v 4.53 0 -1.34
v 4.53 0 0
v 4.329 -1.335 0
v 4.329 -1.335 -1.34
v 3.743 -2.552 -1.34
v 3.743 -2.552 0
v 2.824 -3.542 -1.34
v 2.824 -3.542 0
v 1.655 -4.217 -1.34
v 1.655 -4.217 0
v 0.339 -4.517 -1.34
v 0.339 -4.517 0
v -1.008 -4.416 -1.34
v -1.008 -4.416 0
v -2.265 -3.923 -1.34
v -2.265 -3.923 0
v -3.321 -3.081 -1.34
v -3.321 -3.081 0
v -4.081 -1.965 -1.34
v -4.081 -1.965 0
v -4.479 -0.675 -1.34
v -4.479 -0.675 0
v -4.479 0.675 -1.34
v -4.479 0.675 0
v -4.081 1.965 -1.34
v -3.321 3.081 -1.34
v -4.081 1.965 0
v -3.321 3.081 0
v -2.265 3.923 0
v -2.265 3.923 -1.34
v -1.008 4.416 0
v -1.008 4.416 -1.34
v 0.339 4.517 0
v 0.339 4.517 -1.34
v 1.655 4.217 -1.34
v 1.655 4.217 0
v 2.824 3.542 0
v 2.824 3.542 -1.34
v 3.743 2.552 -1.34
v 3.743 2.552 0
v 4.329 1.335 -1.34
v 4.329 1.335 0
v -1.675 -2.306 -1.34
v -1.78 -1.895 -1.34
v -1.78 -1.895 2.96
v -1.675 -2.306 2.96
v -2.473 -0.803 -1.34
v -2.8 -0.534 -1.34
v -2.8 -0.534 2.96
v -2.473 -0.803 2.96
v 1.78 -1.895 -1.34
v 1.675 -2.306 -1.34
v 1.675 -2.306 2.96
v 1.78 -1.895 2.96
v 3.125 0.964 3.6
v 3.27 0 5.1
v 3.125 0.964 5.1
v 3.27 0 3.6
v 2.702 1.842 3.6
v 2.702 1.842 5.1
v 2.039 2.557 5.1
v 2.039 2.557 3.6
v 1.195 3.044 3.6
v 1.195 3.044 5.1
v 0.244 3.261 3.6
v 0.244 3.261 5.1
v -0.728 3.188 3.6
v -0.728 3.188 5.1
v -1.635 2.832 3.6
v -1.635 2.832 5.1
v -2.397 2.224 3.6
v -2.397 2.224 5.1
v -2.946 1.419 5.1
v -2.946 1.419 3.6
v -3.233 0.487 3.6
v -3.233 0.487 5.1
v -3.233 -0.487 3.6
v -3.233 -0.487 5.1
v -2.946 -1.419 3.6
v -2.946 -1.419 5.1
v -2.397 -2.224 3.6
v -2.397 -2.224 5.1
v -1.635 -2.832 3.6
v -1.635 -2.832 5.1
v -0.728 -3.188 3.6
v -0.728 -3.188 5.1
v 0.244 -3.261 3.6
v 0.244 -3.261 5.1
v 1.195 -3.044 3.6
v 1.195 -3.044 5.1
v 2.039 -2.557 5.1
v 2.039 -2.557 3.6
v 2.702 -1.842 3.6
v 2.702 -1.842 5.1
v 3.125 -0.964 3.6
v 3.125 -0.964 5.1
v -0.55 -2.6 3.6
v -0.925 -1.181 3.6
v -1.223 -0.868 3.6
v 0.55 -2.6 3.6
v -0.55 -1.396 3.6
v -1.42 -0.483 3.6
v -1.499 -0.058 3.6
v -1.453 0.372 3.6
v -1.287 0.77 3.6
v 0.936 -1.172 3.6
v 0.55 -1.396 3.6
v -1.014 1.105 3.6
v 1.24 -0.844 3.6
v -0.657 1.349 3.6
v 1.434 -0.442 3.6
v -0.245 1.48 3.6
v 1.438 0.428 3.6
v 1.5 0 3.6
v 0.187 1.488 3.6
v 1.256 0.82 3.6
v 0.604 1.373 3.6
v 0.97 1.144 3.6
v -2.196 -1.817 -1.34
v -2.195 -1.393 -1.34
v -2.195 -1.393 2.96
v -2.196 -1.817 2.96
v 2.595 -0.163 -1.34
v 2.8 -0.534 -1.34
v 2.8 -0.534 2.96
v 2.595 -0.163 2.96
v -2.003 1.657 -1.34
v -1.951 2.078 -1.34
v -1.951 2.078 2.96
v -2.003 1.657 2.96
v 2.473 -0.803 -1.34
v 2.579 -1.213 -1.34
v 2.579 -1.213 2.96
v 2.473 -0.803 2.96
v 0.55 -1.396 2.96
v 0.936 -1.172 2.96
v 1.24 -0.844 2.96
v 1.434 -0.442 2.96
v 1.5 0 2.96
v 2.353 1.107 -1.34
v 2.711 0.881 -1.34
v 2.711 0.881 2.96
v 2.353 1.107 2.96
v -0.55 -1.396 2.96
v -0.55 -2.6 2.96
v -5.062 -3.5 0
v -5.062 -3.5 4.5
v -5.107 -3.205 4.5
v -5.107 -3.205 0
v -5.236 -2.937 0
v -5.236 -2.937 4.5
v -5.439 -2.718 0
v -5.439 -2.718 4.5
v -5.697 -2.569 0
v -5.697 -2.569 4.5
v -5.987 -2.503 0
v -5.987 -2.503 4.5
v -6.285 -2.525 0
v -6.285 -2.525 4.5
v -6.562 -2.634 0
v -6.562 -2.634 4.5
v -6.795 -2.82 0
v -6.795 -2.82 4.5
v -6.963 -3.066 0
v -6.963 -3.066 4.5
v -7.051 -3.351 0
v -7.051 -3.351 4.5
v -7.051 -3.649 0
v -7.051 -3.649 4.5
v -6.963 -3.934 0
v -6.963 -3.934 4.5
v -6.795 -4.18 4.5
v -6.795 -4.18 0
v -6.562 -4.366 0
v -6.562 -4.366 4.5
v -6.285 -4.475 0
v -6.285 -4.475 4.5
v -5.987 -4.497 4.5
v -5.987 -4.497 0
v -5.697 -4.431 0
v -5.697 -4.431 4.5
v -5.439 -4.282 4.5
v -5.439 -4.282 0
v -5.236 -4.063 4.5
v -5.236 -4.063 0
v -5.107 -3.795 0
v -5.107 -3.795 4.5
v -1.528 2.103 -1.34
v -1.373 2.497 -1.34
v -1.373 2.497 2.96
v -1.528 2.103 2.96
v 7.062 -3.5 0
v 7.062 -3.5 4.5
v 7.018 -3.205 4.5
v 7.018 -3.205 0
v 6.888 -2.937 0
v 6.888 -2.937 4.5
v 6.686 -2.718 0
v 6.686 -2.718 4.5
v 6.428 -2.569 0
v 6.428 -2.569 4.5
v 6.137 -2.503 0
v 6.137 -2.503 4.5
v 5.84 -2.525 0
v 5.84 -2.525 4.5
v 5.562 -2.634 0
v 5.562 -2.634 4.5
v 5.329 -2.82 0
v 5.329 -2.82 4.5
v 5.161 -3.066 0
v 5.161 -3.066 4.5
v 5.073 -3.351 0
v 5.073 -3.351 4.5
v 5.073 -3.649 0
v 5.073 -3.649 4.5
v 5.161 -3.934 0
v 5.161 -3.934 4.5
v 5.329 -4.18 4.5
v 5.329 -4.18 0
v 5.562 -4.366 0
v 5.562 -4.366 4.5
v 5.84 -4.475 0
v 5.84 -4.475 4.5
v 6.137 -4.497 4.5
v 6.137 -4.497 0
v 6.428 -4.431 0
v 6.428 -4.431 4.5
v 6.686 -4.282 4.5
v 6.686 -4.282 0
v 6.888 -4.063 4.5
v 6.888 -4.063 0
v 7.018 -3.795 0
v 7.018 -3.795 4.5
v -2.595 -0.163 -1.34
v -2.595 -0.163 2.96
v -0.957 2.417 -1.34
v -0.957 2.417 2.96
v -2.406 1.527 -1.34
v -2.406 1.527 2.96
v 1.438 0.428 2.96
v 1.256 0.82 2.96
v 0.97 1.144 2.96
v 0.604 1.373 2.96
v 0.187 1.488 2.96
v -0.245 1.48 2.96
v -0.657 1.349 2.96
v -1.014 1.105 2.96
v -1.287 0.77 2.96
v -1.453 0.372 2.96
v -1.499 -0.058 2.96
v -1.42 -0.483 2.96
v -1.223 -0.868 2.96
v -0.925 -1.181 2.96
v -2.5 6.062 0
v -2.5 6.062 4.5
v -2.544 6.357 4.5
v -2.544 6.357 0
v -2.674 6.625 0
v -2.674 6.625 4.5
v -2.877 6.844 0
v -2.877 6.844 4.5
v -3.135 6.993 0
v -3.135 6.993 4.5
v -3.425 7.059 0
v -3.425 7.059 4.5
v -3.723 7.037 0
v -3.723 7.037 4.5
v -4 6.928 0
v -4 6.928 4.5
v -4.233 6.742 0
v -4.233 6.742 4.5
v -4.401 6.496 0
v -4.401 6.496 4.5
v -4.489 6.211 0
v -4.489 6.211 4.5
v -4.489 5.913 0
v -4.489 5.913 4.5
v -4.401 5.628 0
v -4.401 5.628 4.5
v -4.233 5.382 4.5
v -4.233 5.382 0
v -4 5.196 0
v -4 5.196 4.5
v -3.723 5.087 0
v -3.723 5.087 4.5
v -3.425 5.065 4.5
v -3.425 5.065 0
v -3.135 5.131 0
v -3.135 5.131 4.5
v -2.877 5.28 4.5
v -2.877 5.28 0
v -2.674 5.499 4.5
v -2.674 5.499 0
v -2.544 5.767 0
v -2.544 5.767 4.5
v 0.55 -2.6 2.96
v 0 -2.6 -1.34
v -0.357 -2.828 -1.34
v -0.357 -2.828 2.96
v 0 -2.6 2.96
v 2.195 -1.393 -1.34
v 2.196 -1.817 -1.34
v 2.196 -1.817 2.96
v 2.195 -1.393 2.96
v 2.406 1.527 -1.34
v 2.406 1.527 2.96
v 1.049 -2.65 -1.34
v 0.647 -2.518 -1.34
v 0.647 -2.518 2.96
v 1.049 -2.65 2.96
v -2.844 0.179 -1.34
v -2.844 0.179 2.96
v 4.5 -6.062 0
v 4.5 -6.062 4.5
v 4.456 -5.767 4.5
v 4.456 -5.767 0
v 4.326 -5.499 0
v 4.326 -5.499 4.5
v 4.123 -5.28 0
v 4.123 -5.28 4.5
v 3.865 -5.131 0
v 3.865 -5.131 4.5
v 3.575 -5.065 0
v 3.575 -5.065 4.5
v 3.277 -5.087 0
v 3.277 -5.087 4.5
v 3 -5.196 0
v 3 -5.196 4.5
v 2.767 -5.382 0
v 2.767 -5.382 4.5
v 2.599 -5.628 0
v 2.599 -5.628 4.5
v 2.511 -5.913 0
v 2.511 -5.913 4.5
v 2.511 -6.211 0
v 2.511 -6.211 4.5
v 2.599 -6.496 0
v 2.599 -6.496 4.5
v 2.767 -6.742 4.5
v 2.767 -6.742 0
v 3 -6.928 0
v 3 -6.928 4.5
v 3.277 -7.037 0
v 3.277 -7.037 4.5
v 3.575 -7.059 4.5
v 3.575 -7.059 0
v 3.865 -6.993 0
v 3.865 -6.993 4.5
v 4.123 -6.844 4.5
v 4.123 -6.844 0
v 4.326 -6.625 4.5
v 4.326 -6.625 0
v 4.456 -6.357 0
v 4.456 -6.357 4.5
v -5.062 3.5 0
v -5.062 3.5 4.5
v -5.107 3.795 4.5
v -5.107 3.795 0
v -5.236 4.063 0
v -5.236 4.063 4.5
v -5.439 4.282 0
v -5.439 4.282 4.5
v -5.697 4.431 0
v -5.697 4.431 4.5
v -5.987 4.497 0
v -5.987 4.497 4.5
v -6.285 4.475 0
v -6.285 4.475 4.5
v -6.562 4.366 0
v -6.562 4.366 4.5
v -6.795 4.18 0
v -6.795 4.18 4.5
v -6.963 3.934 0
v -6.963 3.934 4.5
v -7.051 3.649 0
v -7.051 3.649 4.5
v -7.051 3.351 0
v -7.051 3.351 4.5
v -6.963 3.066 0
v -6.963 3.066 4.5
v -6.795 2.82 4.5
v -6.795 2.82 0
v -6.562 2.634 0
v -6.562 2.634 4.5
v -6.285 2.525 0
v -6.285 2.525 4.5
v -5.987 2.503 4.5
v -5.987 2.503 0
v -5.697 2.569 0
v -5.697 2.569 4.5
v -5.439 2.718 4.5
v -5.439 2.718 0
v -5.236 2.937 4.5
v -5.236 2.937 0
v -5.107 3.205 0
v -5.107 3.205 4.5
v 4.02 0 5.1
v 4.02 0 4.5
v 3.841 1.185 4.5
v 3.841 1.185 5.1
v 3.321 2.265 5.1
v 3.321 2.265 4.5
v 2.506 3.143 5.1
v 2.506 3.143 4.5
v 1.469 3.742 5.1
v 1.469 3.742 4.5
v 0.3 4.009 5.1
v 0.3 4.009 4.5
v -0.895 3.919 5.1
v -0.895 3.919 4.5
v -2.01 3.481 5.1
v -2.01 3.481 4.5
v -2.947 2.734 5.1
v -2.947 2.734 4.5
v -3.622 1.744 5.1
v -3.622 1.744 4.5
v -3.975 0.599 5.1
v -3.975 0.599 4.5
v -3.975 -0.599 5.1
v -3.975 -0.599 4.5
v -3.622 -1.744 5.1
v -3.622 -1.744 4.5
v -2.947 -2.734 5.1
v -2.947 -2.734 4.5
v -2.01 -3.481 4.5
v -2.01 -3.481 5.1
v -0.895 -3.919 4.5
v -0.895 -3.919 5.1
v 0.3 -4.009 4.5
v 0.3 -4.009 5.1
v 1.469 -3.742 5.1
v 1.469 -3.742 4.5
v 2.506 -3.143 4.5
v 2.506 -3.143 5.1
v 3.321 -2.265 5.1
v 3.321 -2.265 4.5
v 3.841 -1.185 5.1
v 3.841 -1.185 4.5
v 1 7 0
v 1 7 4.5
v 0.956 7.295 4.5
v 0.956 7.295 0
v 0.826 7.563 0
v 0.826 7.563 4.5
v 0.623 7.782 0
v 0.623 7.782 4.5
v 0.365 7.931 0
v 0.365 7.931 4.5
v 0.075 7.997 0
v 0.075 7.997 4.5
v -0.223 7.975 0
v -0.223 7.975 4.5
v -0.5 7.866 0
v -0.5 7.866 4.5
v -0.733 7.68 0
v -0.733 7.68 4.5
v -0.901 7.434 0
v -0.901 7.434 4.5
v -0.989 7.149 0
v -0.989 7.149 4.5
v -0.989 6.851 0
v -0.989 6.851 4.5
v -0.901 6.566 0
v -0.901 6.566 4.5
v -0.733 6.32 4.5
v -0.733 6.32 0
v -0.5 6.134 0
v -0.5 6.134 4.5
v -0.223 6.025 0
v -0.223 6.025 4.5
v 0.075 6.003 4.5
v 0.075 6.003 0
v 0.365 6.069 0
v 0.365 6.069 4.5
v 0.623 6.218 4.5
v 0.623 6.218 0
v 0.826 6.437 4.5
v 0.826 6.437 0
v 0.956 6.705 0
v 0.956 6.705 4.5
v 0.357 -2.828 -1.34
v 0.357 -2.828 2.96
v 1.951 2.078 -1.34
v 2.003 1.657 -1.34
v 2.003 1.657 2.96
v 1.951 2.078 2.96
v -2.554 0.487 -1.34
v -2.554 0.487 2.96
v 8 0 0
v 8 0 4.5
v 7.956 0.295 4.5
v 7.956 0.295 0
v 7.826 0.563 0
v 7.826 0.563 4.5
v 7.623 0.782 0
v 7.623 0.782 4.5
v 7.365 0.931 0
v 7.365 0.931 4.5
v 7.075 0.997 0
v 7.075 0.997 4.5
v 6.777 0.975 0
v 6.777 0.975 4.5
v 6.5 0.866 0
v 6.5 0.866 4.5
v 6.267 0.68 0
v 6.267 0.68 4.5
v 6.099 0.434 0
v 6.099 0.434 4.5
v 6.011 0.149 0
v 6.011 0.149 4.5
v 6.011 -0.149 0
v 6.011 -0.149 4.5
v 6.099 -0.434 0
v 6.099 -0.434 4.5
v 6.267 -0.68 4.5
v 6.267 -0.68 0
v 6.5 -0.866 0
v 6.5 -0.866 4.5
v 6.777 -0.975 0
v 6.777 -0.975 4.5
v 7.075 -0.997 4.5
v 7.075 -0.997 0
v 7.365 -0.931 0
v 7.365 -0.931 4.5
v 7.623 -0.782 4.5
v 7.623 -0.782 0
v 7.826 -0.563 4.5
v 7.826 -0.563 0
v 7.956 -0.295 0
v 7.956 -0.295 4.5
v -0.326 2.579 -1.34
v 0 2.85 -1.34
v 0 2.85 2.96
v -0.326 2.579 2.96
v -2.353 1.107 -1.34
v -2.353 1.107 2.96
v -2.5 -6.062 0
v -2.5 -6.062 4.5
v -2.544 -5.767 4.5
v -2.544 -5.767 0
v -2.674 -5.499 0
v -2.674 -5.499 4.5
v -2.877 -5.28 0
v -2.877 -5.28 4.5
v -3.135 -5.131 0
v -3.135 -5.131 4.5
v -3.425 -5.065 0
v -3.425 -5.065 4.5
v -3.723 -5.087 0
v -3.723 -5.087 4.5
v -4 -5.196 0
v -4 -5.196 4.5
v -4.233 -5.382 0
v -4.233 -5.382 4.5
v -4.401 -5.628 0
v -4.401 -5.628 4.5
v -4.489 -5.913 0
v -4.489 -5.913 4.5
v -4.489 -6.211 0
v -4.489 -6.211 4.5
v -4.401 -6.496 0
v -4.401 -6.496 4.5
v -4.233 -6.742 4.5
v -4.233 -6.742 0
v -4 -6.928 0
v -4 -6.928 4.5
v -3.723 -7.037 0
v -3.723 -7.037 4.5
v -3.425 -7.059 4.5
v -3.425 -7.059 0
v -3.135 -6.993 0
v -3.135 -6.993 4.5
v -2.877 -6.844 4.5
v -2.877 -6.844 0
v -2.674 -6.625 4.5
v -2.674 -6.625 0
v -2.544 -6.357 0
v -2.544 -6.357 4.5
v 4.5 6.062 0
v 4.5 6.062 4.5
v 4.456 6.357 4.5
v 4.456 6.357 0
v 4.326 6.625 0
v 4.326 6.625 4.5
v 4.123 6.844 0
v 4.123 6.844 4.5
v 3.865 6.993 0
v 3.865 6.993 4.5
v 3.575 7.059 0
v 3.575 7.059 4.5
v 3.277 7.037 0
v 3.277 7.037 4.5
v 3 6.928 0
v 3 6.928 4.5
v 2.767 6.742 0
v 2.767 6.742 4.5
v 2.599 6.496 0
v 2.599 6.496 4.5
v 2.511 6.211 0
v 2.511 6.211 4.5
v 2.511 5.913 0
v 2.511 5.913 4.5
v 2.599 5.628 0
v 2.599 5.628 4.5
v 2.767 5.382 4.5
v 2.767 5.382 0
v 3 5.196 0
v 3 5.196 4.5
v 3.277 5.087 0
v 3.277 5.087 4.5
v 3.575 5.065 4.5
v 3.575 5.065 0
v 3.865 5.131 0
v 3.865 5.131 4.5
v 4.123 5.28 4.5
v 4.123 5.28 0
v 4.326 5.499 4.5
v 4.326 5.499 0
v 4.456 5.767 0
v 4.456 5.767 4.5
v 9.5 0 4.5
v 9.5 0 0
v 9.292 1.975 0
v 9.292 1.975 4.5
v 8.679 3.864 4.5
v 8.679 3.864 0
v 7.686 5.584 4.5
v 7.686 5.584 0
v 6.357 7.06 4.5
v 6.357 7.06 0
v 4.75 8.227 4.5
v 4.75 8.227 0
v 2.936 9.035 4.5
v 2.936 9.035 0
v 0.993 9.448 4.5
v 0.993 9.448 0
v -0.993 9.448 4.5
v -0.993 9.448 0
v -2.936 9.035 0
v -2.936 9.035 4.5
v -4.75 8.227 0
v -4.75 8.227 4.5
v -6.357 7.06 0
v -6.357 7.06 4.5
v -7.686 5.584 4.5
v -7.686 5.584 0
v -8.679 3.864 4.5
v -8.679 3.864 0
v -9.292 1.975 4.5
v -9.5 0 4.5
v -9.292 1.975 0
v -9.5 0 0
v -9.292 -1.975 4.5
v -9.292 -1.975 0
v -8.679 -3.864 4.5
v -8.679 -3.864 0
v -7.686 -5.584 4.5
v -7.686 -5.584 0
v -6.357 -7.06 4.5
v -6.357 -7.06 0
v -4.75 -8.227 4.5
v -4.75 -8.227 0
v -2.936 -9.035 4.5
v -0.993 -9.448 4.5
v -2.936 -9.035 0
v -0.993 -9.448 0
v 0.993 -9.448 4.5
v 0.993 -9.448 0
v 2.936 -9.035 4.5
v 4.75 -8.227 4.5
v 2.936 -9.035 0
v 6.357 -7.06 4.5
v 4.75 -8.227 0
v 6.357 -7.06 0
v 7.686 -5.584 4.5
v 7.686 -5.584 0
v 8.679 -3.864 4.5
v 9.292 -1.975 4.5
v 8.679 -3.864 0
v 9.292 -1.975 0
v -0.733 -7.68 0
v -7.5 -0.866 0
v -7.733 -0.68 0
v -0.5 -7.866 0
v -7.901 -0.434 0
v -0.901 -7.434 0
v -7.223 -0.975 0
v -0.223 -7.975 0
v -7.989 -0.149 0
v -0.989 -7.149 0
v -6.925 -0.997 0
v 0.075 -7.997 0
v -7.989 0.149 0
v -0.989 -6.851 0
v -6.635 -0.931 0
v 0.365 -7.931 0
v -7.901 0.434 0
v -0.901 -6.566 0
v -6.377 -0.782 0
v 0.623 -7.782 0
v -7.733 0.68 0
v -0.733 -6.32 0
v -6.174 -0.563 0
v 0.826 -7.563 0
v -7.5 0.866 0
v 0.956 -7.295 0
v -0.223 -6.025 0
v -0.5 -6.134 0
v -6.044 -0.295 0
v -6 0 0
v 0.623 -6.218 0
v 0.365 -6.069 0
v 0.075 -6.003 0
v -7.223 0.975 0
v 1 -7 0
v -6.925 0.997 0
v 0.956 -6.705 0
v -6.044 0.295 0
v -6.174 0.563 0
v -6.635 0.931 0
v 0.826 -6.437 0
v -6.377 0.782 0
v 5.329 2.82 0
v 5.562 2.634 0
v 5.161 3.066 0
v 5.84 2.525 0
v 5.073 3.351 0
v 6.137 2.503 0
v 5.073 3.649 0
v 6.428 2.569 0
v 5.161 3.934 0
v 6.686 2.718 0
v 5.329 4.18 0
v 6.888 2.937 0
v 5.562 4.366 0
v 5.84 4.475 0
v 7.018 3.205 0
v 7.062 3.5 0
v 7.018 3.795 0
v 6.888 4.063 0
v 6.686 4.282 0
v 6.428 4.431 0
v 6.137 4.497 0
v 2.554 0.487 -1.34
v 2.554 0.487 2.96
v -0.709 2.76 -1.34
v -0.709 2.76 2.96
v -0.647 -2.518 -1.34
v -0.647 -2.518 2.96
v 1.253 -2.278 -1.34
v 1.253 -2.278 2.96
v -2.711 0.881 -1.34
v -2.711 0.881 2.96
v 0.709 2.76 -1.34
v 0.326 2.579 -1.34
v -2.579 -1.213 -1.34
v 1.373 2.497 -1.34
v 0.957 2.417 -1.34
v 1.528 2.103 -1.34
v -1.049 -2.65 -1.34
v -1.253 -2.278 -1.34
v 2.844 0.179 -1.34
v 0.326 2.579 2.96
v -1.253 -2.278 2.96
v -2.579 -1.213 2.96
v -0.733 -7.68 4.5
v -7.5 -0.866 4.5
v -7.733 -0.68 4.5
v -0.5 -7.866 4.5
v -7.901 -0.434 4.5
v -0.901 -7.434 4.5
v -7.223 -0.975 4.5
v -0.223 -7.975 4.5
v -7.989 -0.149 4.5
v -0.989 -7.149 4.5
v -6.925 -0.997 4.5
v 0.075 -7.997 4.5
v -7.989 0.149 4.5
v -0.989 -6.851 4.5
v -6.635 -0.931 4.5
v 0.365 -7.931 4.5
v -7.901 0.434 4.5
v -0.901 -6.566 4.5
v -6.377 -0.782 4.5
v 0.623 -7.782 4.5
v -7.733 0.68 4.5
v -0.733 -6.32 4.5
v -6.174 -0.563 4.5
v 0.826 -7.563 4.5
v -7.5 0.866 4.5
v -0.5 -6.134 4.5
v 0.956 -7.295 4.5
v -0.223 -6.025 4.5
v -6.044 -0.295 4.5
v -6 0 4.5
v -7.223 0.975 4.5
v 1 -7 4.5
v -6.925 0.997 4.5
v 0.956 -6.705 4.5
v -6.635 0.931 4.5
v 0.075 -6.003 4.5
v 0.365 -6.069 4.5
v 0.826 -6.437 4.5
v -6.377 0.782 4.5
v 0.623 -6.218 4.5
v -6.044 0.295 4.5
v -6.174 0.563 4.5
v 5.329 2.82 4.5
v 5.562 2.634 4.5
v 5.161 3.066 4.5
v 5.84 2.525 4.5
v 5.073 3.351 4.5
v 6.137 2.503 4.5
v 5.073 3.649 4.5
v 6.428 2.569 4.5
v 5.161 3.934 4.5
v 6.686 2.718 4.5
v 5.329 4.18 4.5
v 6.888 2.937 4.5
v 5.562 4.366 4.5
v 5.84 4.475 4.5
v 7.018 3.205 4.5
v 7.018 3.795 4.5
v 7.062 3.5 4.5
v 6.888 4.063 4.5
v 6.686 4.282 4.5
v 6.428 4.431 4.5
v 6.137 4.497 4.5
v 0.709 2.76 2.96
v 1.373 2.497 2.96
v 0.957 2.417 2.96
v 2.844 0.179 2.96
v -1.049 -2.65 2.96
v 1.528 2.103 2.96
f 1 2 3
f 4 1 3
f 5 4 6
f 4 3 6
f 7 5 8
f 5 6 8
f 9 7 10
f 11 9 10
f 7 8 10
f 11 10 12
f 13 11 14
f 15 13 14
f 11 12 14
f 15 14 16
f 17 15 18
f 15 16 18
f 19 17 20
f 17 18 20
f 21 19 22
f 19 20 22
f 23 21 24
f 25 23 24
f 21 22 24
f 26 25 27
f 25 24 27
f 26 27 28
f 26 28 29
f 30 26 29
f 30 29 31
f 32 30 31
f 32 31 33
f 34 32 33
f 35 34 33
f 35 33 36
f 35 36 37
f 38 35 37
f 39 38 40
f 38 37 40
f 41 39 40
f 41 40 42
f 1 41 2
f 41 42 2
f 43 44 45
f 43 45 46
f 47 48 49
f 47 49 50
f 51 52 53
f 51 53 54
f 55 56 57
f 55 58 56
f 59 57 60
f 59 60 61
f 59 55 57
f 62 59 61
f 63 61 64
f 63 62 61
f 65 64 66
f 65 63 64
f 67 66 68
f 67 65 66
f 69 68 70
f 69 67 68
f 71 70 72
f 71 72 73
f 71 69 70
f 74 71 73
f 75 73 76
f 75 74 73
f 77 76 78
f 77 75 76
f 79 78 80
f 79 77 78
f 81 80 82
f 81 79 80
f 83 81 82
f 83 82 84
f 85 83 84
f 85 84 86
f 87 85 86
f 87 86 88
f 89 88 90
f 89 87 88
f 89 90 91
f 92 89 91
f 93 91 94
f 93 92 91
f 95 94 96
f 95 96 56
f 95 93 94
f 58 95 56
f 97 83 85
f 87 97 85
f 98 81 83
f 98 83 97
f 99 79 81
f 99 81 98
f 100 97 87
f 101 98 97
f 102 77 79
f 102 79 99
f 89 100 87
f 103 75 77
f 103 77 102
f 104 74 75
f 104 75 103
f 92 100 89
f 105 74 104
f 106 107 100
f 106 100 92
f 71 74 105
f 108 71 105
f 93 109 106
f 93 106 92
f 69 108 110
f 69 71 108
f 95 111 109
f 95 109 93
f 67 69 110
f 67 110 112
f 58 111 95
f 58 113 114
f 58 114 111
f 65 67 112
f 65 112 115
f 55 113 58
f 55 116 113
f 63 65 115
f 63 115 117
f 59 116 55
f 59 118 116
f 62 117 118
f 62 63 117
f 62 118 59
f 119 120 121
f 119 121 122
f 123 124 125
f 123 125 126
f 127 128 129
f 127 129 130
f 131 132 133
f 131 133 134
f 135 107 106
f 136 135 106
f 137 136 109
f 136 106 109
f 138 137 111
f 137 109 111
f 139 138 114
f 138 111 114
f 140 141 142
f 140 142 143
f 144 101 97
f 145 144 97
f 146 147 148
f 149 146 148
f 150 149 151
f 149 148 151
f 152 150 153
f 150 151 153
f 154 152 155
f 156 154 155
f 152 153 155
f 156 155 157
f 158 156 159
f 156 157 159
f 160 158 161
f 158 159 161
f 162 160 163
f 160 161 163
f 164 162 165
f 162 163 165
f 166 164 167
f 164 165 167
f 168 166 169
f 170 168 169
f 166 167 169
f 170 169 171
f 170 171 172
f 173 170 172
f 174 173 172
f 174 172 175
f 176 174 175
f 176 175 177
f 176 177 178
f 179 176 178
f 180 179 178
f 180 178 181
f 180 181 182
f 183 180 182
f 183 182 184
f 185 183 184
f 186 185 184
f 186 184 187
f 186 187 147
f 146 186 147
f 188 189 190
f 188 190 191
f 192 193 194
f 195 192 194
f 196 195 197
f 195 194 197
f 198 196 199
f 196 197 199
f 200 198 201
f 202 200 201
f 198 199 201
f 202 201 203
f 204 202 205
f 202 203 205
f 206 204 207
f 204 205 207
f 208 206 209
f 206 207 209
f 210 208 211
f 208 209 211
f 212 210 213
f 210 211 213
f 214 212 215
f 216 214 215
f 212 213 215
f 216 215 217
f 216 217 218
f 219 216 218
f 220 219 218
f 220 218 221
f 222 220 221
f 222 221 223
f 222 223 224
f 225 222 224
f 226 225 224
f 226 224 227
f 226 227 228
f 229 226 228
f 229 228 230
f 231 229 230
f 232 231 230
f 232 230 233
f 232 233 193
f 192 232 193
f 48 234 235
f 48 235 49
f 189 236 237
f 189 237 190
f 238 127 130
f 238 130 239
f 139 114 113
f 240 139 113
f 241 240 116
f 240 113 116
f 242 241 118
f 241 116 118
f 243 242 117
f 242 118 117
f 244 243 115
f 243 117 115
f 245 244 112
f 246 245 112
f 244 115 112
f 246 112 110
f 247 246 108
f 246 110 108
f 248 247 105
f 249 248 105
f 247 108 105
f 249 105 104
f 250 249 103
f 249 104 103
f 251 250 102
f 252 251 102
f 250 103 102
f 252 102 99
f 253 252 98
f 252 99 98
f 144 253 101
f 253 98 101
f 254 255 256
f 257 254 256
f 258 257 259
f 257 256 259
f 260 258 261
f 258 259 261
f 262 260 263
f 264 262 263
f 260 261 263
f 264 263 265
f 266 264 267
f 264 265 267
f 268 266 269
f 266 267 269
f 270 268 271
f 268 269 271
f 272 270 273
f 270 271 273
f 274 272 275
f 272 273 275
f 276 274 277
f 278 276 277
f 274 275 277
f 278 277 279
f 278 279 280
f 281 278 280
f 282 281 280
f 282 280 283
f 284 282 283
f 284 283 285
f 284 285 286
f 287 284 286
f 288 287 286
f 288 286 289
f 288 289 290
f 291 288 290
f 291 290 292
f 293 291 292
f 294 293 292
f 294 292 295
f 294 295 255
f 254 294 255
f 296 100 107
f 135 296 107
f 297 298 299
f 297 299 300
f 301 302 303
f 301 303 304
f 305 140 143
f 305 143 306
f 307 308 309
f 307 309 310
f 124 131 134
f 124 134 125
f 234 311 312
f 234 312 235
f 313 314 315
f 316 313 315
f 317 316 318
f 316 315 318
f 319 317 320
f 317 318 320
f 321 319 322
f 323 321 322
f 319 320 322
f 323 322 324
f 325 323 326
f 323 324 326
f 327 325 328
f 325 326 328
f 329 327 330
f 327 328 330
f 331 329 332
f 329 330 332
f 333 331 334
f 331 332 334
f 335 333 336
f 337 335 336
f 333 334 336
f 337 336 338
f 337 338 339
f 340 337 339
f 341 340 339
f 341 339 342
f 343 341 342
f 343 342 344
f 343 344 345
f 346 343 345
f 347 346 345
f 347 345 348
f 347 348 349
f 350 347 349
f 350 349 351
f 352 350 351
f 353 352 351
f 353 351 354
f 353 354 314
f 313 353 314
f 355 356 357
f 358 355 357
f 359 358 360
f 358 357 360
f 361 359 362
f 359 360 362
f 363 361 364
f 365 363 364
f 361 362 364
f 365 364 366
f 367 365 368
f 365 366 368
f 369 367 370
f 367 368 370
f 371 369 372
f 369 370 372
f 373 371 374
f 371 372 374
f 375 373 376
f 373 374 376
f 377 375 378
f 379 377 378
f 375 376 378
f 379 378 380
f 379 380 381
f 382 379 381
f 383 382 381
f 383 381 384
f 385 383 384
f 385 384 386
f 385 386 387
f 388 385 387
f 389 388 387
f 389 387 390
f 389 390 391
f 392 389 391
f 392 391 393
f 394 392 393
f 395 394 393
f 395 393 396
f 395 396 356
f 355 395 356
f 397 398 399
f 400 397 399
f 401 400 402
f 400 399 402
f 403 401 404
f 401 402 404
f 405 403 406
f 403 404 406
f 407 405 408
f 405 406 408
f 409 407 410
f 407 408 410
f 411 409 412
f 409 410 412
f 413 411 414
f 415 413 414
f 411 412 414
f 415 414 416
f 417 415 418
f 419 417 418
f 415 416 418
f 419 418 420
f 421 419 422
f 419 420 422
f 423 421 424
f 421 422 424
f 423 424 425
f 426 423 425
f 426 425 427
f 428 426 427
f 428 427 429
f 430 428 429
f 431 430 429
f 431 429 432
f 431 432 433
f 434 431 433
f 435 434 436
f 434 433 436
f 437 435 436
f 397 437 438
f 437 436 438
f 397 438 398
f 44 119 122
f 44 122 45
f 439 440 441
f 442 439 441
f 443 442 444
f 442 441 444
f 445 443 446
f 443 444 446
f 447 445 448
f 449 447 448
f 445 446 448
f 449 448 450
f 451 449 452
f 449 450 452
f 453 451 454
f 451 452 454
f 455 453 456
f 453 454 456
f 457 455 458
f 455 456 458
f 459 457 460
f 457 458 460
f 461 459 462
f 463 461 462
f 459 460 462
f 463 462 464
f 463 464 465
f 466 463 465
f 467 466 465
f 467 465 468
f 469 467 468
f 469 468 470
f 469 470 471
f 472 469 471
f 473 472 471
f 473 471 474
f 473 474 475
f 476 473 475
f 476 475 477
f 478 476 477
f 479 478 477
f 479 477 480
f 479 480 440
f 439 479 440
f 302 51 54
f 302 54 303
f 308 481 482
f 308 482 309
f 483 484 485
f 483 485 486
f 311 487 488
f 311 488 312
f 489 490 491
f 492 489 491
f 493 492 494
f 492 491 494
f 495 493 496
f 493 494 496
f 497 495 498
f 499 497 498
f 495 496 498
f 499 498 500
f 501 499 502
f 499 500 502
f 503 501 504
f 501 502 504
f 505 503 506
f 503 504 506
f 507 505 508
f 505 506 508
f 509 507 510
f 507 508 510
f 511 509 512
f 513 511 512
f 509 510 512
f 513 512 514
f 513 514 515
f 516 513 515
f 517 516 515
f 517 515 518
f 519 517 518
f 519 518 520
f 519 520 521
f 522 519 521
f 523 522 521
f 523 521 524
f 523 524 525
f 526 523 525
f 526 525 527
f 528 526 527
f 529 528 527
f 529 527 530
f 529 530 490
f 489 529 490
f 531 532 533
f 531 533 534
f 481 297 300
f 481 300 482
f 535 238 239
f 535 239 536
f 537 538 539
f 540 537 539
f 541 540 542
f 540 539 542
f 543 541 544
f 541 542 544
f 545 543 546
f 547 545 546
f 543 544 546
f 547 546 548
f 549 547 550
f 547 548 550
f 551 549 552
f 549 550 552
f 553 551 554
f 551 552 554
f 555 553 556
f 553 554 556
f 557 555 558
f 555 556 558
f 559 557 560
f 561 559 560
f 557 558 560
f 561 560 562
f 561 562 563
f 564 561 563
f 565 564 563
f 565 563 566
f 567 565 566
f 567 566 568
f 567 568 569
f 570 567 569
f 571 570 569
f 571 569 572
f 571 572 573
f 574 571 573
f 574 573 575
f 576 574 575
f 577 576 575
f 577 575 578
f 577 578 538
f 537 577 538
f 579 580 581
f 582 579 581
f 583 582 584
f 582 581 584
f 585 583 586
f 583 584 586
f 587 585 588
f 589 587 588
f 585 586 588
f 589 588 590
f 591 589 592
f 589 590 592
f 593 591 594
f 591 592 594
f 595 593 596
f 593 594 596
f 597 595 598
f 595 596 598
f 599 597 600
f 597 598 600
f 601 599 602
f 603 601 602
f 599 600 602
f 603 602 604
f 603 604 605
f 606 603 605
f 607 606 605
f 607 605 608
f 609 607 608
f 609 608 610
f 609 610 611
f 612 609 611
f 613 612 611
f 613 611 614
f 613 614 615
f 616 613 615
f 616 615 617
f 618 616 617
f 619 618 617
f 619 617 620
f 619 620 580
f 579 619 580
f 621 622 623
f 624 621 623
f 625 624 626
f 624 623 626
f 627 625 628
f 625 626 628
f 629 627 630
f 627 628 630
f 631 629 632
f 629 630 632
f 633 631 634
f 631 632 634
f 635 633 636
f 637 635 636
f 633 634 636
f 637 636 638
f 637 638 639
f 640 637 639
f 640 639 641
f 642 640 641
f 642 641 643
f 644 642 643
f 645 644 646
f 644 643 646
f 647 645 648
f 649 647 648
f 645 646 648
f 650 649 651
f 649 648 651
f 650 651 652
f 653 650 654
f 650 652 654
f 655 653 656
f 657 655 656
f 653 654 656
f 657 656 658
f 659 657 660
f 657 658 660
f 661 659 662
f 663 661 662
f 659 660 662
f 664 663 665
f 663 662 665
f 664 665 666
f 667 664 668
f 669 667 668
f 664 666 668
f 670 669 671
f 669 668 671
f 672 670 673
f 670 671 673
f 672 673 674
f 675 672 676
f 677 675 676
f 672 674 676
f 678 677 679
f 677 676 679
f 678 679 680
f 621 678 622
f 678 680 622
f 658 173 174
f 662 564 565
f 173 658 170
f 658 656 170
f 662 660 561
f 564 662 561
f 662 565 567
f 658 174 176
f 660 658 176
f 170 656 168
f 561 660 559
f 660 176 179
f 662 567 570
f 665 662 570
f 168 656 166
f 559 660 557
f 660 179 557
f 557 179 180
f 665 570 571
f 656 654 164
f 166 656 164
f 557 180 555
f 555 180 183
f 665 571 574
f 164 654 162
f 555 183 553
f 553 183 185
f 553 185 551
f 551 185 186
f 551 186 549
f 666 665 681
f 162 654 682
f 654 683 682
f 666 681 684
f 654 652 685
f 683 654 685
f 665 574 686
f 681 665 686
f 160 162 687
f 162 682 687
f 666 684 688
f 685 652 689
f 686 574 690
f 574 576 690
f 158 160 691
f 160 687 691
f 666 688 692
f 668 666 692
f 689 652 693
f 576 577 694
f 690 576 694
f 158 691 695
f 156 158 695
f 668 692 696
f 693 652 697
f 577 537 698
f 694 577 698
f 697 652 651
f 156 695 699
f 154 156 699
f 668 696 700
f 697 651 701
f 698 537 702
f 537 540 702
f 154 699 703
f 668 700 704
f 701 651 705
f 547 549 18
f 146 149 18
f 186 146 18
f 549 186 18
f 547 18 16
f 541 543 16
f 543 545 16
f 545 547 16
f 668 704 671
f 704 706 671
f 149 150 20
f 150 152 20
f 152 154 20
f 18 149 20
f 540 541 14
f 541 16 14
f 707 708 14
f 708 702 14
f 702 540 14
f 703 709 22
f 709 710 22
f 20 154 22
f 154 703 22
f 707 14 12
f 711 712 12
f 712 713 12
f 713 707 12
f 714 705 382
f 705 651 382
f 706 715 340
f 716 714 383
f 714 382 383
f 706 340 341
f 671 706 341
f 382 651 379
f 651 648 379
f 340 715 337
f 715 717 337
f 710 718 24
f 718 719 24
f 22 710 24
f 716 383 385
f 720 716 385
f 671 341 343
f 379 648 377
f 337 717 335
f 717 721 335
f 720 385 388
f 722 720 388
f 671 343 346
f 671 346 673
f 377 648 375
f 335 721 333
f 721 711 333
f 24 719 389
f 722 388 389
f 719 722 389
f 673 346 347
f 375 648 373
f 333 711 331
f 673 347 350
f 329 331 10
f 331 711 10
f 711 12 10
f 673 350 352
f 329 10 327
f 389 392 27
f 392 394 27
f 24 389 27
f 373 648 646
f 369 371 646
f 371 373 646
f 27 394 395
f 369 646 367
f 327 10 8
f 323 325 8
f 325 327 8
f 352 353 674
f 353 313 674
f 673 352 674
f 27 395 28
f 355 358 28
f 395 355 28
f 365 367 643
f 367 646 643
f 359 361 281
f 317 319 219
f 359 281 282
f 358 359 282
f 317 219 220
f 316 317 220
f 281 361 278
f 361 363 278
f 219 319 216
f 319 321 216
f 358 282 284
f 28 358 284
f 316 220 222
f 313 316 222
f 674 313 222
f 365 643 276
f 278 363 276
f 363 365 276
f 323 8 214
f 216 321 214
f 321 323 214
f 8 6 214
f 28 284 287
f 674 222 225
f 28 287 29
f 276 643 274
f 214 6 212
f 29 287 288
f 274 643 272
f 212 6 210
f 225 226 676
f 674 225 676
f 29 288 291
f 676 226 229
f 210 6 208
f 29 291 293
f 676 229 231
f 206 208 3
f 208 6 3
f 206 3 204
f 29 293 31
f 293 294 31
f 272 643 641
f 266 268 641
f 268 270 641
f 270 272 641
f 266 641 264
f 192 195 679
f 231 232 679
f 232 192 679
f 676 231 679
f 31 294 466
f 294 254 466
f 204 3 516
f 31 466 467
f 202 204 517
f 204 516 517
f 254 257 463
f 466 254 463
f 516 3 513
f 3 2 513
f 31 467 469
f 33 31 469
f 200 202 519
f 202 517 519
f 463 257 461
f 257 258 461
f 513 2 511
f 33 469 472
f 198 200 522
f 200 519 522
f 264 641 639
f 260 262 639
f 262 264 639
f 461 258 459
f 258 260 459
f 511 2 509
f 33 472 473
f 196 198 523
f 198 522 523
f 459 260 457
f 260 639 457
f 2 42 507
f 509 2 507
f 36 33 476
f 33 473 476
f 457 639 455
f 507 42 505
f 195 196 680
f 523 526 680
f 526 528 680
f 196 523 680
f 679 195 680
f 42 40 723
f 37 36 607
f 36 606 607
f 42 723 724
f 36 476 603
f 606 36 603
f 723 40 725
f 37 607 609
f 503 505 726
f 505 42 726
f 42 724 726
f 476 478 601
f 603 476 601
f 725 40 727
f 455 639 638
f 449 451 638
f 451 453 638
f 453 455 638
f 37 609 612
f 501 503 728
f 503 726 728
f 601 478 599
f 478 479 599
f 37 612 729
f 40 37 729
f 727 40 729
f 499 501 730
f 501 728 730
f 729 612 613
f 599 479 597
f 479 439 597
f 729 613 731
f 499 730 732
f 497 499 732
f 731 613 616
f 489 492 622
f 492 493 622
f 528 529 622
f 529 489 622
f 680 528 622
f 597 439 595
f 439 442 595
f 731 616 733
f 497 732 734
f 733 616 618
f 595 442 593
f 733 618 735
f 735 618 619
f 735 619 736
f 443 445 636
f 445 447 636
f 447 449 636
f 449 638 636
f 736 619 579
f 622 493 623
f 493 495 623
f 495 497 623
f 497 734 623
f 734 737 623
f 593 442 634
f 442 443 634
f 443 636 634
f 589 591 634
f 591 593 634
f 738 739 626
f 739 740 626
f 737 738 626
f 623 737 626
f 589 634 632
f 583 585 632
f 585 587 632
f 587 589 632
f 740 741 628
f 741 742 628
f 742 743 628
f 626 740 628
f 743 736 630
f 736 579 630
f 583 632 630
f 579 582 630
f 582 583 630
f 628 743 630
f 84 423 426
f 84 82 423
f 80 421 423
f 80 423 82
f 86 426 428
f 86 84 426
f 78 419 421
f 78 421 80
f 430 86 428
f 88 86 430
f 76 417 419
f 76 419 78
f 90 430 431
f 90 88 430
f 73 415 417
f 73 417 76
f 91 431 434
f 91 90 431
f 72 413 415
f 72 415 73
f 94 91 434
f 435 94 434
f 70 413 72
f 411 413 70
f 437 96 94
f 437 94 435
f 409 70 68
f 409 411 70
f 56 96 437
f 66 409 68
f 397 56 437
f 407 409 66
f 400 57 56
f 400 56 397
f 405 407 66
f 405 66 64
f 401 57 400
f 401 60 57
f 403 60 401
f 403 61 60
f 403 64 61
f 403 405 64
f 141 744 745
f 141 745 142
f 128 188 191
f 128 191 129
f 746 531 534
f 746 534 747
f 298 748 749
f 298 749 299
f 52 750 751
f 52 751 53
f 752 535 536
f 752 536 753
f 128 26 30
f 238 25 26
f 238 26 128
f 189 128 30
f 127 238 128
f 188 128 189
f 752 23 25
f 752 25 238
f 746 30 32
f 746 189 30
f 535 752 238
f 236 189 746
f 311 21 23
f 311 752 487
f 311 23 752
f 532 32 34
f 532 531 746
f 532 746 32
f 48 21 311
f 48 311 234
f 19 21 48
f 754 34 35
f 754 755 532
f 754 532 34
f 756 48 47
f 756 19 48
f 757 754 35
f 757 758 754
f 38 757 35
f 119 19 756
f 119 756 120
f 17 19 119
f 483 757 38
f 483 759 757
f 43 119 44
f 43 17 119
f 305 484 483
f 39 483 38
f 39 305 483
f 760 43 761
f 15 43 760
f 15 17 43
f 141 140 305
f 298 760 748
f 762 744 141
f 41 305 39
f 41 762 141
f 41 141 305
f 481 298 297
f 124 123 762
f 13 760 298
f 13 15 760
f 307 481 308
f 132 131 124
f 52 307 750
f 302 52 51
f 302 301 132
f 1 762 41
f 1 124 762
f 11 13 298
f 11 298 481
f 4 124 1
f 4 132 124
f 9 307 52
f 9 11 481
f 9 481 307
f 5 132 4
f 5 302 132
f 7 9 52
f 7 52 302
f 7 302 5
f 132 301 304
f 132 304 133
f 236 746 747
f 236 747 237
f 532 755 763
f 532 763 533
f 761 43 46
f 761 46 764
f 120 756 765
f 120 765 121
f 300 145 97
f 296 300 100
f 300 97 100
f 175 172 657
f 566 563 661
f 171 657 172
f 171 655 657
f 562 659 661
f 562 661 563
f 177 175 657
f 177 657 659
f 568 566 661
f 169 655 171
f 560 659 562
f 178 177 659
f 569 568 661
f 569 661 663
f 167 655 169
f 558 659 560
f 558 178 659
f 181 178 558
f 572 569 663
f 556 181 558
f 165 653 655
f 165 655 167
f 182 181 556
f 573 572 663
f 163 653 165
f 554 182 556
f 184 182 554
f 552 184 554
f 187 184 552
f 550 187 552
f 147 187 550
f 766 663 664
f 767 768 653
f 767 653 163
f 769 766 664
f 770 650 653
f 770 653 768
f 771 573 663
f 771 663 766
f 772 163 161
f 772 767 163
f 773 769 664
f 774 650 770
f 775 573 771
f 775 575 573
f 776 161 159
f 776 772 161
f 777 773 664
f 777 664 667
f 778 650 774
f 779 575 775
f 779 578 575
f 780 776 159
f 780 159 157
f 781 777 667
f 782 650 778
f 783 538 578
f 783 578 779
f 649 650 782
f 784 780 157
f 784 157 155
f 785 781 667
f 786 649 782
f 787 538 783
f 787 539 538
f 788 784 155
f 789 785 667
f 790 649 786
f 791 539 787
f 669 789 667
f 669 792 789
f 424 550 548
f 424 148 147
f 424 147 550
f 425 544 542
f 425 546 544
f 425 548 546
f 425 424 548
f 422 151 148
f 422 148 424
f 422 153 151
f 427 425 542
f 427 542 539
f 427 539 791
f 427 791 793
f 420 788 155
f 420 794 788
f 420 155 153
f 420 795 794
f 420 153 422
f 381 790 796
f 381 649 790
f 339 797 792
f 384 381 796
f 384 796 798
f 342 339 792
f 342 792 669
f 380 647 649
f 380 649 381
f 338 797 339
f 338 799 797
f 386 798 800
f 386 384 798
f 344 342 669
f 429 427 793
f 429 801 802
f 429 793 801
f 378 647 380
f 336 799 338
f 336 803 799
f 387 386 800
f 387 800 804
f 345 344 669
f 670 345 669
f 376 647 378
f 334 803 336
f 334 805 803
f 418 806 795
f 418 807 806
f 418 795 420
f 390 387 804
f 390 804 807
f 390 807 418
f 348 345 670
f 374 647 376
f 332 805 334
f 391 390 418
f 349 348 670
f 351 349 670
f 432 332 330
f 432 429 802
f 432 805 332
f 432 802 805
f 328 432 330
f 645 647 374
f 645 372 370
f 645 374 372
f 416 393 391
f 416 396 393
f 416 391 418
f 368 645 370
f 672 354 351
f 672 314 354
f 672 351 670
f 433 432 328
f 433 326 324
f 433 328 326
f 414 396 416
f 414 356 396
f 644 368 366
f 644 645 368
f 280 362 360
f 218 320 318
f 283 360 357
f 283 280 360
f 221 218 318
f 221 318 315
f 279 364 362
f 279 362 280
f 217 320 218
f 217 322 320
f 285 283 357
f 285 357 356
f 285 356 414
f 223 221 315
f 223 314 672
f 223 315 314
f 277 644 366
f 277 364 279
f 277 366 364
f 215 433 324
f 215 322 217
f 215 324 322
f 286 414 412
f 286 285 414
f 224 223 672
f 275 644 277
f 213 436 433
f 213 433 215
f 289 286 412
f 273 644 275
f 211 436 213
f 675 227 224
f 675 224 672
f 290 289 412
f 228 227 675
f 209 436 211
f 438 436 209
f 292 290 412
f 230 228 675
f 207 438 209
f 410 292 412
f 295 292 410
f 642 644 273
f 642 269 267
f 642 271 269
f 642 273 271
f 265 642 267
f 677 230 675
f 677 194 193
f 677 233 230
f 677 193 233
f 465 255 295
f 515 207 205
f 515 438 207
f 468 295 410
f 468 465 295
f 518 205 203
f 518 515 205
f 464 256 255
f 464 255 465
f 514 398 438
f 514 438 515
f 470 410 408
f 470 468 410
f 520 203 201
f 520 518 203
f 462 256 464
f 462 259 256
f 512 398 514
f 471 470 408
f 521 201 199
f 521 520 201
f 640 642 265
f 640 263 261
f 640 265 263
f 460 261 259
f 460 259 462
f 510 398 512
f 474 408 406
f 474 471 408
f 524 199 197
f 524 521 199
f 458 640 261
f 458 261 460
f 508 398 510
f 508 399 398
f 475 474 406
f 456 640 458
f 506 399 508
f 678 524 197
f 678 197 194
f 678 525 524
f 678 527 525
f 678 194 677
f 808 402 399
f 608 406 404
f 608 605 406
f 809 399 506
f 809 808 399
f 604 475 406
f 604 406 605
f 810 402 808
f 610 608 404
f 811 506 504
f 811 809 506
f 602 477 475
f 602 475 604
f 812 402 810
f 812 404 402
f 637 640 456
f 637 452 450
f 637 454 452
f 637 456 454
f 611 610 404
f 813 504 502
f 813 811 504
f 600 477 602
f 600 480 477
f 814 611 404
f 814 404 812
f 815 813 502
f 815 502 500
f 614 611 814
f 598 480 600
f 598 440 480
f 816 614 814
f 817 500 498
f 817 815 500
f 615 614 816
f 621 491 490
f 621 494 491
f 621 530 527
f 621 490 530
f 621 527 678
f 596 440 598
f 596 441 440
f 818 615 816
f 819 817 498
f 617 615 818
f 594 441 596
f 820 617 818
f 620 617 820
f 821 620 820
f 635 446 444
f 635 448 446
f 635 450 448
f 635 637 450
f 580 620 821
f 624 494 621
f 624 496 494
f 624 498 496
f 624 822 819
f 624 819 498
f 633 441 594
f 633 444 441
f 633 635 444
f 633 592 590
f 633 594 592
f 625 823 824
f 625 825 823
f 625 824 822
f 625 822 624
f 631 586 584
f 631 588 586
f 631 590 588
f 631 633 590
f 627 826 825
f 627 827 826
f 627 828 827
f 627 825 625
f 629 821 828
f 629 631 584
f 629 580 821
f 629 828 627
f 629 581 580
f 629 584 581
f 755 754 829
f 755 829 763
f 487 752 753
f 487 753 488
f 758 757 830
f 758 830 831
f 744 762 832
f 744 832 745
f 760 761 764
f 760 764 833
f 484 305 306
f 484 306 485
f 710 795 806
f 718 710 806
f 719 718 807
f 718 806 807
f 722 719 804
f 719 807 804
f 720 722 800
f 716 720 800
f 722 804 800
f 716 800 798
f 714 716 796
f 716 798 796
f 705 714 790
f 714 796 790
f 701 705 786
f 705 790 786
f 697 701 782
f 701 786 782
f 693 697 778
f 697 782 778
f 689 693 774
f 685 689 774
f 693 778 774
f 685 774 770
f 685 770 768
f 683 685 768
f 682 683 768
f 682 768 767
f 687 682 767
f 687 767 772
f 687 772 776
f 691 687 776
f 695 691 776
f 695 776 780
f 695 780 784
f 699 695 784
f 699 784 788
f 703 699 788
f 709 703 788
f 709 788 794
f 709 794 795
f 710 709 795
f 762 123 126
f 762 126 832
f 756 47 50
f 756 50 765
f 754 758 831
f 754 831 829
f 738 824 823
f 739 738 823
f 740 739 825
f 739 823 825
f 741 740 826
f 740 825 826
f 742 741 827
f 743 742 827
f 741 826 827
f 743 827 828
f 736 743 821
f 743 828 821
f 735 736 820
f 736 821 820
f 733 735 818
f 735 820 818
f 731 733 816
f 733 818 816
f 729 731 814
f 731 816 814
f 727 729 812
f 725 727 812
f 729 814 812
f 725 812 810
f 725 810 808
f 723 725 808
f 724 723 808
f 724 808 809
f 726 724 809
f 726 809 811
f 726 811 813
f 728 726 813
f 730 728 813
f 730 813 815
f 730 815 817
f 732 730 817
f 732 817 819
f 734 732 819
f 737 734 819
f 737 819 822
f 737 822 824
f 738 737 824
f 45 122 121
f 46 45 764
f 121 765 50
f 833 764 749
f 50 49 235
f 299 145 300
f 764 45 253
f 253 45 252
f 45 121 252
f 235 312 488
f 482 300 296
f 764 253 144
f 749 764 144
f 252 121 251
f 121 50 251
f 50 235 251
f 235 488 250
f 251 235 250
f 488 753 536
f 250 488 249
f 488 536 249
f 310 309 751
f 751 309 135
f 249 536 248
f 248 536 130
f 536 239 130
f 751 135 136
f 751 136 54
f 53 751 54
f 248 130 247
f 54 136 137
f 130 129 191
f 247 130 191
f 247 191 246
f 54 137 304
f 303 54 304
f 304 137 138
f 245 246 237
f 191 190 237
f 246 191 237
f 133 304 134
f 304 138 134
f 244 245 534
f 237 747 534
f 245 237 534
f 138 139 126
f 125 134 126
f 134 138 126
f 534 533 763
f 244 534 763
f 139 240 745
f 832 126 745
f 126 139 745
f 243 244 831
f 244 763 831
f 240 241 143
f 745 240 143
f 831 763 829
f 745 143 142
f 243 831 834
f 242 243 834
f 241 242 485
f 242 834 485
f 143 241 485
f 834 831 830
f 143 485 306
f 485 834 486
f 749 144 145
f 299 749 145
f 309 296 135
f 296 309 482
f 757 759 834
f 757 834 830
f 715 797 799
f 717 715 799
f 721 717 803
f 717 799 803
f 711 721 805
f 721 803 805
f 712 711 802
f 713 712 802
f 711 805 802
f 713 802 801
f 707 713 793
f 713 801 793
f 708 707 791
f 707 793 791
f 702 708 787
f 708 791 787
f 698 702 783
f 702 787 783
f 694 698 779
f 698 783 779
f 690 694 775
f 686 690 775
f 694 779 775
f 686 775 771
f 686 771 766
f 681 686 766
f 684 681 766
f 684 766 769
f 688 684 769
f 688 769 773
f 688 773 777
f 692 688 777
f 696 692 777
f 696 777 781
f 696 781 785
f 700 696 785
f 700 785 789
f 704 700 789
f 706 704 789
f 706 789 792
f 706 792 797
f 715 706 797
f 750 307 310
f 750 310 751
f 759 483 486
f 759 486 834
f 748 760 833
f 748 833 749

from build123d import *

# Parameters (mm, degrees)
BASE_R                       = 9.5
BODY_DEPTH                   = 4.5
BASE_2_R                     = 4.53
SPLINE_EXTRUSION_BACK_DEPTH  = 1.34
BASE_3_R                     = 4.02
BASE_3_R_2                   = 3.27
SPLINE_EXTRUSION_FRONT_DEPTH = 0.6
FRONT_START                  = -0.9
FRONT_BASE_R                 = 3.27
FRONT_RECESSION_DEPTH        = 0.9
SPLINE_DEPTH                 = 4.3
CENTER_SCREW_HOLE_DEPTH      = 0.64
SCREW_HOLE_SKETCH_R          = 1
SCREW_HOLES_DEPTH            = 15.649423197


with BuildPart() as part:
    # base → body (new body)
    with BuildSketch(Plane.XY):
        Circle(BASE_R)
    extrude(amount=BODY_DEPTH)

    # base 2 → spline extrusion back (add)
    with BuildSketch(Plane(origin=(0, 0, 0), x_dir=(-1, 0, 0), z_dir=(0, 0, -1))):
        with Locations(Location((0, 0, 0), (0, 0, 180))):
            Circle(BASE_2_R)
    extrude(amount=SPLINE_EXTRUSION_BACK_DEPTH)

    # base 3 → spline extrusion front (add)
    with BuildSketch(Plane.XY.offset(4.5)):
        Circle(BASE_3_R)
        Circle(BASE_3_R_2, mode=Mode.SUBTRACT)
    extrude(amount=SPLINE_EXTRUSION_FRONT_DEPTH)

    # front base → front recession (cut)
    with BuildSketch(Plane.XY.offset(4.5).offset(FRONT_START)):
        Circle(FRONT_BASE_R)
    extrude(amount=FRONT_RECESSION_DEPTH, mode=Mode.SUBTRACT)

    # spline profile → spline (cut)
    with BuildSketch(Plane(origin=(0, 0, -1.34), x_dir=(-1, 0, 0), z_dir=(0, 0, -1))):
        Polygon((-0.325866407, 2.579498223), (0, 2.85), (0.325866407, 2.579498223), (0.708766178, 2.760462009), (0.957123837, 2.417418863), (1.372997971, 2.497474038), (1.528241656, 2.103444185), (1.950959252, 2.077560588), (2.003334431, 1.657302373), (2.406334588, 1.527106366), (2.352550336, 1.107026158), (2.710511071, 0.880698434), (2.553946852, 0.487191418), (2.844376176, 0.178952981), (2.594869494, -0.163255351), (2.799518665, -0.534036747), (2.472746942, -0.803444185), (2.5787571, -1.213470981), (2.195252606, -1.393149667), (2.195962742, -1.816658371), (1.779822475, -1.895318431), (1.675187969, -2.305698434), (1.252559553, -2.278397368), (1.049154975, -2.649862985), (0.646593707, -2.518316219), (0.357199716, -2.827526899), (0, -2.6), (-0.357199716, -2.827526899), (-0.646593707, -2.518316219), (-1.049154975, -2.649862985), (-1.252559553, -2.278397368), (-1.675187969, -2.305698434), (-1.779822475, -1.895318431), (-2.195962742, -1.816658371), (-2.195252606, -1.393149667), (-2.5787571, -1.213470981), (-2.472746942, -0.803444185), (-2.799518665, -0.534036747), (-2.594869494, -0.163255351), (-2.844376176, 0.178952981), (-2.553946852, 0.487191418), (-2.710511071, 0.880698434), (-2.352550336, 1.107026158), (-2.406334588, 1.527106366), (-2.003334431, 1.657302373), (-1.950959252, 2.077560588), (-1.528241656, 2.103444185), (-1.372997971, 2.497474038), (-0.957123837, 2.417418863), (-0.708766178, 2.760462009), align=None)
    extrude(amount=-SPLINE_DEPTH, mode=Mode.SUBTRACT)

    # center screw hole sketch → center screw hole (cut)
    with BuildSketch(Plane.XY.offset(3.6)):
        with BuildLine():
            Line((-0.55, -2.6), (0.55, -2.6))
            Line((0.55, -2.6), (0.55, -1.395528574))
            ThreePointArc((0.55, -1.395528574), (0, -1.5), (-0.55, -1.395528574))
            Line((-0.55, -1.395528574), (-0.55, -2.6))
        make_face()
        with BuildLine():
            ThreePointArc((-0.55, -1.395528574), (0, -1.5), (0.55, -1.395528574))
            ThreePointArc((0.55, -1.395528574), (1.239959677, -0.844097151), (1.5, 0))
            ThreePointArc((1.5, 0), (-0.844097151, 1.239959677), (-0.55, -1.395528574))
        make_face()
    extrude(amount=-CENTER_SCREW_HOLE_DEPTH, mode=Mode.SUBTRACT)

    # screw hole sketch → screw holes (cut, through all)
    with BuildSketch(Plane.XY.offset(4.5)):
        with Locations((0, 7)):
            Circle(SCREW_HOLE_SKETCH_R)
        with Locations((3.5, 6.062177826)):
            Circle(SCREW_HOLE_SKETCH_R)
        with Locations((6.062177826, 3.5)):
            Circle(SCREW_HOLE_SKETCH_R)
        with Locations((7, 0)):
            Circle(SCREW_HOLE_SKETCH_R)
        with Locations((6.062177826, -3.5)):
            Circle(SCREW_HOLE_SKETCH_R)
        with Locations((3.5, -6.062177826)):
            Circle(SCREW_HOLE_SKETCH_R)
        with Locations((0, -7)):
            Circle(SCREW_HOLE_SKETCH_R)
        with Locations((-3.5, -6.062177826)):
            Circle(SCREW_HOLE_SKETCH_R)
        with Locations((-6.062177826, -3.5)):
            Circle(SCREW_HOLE_SKETCH_R)
        with Locations((-7, 0)):
            Circle(SCREW_HOLE_SKETCH_R)
        with Locations((-6.062177826, 3.5)):
            Circle(SCREW_HOLE_SKETCH_R)
        with Locations((-3.5, 6.062177826)):
            Circle(SCREW_HOLE_SKETCH_R)
    extrude(amount=-SCREW_HOLES_DEPTH, mode=Mode.SUBTRACT)


solid = part.part
